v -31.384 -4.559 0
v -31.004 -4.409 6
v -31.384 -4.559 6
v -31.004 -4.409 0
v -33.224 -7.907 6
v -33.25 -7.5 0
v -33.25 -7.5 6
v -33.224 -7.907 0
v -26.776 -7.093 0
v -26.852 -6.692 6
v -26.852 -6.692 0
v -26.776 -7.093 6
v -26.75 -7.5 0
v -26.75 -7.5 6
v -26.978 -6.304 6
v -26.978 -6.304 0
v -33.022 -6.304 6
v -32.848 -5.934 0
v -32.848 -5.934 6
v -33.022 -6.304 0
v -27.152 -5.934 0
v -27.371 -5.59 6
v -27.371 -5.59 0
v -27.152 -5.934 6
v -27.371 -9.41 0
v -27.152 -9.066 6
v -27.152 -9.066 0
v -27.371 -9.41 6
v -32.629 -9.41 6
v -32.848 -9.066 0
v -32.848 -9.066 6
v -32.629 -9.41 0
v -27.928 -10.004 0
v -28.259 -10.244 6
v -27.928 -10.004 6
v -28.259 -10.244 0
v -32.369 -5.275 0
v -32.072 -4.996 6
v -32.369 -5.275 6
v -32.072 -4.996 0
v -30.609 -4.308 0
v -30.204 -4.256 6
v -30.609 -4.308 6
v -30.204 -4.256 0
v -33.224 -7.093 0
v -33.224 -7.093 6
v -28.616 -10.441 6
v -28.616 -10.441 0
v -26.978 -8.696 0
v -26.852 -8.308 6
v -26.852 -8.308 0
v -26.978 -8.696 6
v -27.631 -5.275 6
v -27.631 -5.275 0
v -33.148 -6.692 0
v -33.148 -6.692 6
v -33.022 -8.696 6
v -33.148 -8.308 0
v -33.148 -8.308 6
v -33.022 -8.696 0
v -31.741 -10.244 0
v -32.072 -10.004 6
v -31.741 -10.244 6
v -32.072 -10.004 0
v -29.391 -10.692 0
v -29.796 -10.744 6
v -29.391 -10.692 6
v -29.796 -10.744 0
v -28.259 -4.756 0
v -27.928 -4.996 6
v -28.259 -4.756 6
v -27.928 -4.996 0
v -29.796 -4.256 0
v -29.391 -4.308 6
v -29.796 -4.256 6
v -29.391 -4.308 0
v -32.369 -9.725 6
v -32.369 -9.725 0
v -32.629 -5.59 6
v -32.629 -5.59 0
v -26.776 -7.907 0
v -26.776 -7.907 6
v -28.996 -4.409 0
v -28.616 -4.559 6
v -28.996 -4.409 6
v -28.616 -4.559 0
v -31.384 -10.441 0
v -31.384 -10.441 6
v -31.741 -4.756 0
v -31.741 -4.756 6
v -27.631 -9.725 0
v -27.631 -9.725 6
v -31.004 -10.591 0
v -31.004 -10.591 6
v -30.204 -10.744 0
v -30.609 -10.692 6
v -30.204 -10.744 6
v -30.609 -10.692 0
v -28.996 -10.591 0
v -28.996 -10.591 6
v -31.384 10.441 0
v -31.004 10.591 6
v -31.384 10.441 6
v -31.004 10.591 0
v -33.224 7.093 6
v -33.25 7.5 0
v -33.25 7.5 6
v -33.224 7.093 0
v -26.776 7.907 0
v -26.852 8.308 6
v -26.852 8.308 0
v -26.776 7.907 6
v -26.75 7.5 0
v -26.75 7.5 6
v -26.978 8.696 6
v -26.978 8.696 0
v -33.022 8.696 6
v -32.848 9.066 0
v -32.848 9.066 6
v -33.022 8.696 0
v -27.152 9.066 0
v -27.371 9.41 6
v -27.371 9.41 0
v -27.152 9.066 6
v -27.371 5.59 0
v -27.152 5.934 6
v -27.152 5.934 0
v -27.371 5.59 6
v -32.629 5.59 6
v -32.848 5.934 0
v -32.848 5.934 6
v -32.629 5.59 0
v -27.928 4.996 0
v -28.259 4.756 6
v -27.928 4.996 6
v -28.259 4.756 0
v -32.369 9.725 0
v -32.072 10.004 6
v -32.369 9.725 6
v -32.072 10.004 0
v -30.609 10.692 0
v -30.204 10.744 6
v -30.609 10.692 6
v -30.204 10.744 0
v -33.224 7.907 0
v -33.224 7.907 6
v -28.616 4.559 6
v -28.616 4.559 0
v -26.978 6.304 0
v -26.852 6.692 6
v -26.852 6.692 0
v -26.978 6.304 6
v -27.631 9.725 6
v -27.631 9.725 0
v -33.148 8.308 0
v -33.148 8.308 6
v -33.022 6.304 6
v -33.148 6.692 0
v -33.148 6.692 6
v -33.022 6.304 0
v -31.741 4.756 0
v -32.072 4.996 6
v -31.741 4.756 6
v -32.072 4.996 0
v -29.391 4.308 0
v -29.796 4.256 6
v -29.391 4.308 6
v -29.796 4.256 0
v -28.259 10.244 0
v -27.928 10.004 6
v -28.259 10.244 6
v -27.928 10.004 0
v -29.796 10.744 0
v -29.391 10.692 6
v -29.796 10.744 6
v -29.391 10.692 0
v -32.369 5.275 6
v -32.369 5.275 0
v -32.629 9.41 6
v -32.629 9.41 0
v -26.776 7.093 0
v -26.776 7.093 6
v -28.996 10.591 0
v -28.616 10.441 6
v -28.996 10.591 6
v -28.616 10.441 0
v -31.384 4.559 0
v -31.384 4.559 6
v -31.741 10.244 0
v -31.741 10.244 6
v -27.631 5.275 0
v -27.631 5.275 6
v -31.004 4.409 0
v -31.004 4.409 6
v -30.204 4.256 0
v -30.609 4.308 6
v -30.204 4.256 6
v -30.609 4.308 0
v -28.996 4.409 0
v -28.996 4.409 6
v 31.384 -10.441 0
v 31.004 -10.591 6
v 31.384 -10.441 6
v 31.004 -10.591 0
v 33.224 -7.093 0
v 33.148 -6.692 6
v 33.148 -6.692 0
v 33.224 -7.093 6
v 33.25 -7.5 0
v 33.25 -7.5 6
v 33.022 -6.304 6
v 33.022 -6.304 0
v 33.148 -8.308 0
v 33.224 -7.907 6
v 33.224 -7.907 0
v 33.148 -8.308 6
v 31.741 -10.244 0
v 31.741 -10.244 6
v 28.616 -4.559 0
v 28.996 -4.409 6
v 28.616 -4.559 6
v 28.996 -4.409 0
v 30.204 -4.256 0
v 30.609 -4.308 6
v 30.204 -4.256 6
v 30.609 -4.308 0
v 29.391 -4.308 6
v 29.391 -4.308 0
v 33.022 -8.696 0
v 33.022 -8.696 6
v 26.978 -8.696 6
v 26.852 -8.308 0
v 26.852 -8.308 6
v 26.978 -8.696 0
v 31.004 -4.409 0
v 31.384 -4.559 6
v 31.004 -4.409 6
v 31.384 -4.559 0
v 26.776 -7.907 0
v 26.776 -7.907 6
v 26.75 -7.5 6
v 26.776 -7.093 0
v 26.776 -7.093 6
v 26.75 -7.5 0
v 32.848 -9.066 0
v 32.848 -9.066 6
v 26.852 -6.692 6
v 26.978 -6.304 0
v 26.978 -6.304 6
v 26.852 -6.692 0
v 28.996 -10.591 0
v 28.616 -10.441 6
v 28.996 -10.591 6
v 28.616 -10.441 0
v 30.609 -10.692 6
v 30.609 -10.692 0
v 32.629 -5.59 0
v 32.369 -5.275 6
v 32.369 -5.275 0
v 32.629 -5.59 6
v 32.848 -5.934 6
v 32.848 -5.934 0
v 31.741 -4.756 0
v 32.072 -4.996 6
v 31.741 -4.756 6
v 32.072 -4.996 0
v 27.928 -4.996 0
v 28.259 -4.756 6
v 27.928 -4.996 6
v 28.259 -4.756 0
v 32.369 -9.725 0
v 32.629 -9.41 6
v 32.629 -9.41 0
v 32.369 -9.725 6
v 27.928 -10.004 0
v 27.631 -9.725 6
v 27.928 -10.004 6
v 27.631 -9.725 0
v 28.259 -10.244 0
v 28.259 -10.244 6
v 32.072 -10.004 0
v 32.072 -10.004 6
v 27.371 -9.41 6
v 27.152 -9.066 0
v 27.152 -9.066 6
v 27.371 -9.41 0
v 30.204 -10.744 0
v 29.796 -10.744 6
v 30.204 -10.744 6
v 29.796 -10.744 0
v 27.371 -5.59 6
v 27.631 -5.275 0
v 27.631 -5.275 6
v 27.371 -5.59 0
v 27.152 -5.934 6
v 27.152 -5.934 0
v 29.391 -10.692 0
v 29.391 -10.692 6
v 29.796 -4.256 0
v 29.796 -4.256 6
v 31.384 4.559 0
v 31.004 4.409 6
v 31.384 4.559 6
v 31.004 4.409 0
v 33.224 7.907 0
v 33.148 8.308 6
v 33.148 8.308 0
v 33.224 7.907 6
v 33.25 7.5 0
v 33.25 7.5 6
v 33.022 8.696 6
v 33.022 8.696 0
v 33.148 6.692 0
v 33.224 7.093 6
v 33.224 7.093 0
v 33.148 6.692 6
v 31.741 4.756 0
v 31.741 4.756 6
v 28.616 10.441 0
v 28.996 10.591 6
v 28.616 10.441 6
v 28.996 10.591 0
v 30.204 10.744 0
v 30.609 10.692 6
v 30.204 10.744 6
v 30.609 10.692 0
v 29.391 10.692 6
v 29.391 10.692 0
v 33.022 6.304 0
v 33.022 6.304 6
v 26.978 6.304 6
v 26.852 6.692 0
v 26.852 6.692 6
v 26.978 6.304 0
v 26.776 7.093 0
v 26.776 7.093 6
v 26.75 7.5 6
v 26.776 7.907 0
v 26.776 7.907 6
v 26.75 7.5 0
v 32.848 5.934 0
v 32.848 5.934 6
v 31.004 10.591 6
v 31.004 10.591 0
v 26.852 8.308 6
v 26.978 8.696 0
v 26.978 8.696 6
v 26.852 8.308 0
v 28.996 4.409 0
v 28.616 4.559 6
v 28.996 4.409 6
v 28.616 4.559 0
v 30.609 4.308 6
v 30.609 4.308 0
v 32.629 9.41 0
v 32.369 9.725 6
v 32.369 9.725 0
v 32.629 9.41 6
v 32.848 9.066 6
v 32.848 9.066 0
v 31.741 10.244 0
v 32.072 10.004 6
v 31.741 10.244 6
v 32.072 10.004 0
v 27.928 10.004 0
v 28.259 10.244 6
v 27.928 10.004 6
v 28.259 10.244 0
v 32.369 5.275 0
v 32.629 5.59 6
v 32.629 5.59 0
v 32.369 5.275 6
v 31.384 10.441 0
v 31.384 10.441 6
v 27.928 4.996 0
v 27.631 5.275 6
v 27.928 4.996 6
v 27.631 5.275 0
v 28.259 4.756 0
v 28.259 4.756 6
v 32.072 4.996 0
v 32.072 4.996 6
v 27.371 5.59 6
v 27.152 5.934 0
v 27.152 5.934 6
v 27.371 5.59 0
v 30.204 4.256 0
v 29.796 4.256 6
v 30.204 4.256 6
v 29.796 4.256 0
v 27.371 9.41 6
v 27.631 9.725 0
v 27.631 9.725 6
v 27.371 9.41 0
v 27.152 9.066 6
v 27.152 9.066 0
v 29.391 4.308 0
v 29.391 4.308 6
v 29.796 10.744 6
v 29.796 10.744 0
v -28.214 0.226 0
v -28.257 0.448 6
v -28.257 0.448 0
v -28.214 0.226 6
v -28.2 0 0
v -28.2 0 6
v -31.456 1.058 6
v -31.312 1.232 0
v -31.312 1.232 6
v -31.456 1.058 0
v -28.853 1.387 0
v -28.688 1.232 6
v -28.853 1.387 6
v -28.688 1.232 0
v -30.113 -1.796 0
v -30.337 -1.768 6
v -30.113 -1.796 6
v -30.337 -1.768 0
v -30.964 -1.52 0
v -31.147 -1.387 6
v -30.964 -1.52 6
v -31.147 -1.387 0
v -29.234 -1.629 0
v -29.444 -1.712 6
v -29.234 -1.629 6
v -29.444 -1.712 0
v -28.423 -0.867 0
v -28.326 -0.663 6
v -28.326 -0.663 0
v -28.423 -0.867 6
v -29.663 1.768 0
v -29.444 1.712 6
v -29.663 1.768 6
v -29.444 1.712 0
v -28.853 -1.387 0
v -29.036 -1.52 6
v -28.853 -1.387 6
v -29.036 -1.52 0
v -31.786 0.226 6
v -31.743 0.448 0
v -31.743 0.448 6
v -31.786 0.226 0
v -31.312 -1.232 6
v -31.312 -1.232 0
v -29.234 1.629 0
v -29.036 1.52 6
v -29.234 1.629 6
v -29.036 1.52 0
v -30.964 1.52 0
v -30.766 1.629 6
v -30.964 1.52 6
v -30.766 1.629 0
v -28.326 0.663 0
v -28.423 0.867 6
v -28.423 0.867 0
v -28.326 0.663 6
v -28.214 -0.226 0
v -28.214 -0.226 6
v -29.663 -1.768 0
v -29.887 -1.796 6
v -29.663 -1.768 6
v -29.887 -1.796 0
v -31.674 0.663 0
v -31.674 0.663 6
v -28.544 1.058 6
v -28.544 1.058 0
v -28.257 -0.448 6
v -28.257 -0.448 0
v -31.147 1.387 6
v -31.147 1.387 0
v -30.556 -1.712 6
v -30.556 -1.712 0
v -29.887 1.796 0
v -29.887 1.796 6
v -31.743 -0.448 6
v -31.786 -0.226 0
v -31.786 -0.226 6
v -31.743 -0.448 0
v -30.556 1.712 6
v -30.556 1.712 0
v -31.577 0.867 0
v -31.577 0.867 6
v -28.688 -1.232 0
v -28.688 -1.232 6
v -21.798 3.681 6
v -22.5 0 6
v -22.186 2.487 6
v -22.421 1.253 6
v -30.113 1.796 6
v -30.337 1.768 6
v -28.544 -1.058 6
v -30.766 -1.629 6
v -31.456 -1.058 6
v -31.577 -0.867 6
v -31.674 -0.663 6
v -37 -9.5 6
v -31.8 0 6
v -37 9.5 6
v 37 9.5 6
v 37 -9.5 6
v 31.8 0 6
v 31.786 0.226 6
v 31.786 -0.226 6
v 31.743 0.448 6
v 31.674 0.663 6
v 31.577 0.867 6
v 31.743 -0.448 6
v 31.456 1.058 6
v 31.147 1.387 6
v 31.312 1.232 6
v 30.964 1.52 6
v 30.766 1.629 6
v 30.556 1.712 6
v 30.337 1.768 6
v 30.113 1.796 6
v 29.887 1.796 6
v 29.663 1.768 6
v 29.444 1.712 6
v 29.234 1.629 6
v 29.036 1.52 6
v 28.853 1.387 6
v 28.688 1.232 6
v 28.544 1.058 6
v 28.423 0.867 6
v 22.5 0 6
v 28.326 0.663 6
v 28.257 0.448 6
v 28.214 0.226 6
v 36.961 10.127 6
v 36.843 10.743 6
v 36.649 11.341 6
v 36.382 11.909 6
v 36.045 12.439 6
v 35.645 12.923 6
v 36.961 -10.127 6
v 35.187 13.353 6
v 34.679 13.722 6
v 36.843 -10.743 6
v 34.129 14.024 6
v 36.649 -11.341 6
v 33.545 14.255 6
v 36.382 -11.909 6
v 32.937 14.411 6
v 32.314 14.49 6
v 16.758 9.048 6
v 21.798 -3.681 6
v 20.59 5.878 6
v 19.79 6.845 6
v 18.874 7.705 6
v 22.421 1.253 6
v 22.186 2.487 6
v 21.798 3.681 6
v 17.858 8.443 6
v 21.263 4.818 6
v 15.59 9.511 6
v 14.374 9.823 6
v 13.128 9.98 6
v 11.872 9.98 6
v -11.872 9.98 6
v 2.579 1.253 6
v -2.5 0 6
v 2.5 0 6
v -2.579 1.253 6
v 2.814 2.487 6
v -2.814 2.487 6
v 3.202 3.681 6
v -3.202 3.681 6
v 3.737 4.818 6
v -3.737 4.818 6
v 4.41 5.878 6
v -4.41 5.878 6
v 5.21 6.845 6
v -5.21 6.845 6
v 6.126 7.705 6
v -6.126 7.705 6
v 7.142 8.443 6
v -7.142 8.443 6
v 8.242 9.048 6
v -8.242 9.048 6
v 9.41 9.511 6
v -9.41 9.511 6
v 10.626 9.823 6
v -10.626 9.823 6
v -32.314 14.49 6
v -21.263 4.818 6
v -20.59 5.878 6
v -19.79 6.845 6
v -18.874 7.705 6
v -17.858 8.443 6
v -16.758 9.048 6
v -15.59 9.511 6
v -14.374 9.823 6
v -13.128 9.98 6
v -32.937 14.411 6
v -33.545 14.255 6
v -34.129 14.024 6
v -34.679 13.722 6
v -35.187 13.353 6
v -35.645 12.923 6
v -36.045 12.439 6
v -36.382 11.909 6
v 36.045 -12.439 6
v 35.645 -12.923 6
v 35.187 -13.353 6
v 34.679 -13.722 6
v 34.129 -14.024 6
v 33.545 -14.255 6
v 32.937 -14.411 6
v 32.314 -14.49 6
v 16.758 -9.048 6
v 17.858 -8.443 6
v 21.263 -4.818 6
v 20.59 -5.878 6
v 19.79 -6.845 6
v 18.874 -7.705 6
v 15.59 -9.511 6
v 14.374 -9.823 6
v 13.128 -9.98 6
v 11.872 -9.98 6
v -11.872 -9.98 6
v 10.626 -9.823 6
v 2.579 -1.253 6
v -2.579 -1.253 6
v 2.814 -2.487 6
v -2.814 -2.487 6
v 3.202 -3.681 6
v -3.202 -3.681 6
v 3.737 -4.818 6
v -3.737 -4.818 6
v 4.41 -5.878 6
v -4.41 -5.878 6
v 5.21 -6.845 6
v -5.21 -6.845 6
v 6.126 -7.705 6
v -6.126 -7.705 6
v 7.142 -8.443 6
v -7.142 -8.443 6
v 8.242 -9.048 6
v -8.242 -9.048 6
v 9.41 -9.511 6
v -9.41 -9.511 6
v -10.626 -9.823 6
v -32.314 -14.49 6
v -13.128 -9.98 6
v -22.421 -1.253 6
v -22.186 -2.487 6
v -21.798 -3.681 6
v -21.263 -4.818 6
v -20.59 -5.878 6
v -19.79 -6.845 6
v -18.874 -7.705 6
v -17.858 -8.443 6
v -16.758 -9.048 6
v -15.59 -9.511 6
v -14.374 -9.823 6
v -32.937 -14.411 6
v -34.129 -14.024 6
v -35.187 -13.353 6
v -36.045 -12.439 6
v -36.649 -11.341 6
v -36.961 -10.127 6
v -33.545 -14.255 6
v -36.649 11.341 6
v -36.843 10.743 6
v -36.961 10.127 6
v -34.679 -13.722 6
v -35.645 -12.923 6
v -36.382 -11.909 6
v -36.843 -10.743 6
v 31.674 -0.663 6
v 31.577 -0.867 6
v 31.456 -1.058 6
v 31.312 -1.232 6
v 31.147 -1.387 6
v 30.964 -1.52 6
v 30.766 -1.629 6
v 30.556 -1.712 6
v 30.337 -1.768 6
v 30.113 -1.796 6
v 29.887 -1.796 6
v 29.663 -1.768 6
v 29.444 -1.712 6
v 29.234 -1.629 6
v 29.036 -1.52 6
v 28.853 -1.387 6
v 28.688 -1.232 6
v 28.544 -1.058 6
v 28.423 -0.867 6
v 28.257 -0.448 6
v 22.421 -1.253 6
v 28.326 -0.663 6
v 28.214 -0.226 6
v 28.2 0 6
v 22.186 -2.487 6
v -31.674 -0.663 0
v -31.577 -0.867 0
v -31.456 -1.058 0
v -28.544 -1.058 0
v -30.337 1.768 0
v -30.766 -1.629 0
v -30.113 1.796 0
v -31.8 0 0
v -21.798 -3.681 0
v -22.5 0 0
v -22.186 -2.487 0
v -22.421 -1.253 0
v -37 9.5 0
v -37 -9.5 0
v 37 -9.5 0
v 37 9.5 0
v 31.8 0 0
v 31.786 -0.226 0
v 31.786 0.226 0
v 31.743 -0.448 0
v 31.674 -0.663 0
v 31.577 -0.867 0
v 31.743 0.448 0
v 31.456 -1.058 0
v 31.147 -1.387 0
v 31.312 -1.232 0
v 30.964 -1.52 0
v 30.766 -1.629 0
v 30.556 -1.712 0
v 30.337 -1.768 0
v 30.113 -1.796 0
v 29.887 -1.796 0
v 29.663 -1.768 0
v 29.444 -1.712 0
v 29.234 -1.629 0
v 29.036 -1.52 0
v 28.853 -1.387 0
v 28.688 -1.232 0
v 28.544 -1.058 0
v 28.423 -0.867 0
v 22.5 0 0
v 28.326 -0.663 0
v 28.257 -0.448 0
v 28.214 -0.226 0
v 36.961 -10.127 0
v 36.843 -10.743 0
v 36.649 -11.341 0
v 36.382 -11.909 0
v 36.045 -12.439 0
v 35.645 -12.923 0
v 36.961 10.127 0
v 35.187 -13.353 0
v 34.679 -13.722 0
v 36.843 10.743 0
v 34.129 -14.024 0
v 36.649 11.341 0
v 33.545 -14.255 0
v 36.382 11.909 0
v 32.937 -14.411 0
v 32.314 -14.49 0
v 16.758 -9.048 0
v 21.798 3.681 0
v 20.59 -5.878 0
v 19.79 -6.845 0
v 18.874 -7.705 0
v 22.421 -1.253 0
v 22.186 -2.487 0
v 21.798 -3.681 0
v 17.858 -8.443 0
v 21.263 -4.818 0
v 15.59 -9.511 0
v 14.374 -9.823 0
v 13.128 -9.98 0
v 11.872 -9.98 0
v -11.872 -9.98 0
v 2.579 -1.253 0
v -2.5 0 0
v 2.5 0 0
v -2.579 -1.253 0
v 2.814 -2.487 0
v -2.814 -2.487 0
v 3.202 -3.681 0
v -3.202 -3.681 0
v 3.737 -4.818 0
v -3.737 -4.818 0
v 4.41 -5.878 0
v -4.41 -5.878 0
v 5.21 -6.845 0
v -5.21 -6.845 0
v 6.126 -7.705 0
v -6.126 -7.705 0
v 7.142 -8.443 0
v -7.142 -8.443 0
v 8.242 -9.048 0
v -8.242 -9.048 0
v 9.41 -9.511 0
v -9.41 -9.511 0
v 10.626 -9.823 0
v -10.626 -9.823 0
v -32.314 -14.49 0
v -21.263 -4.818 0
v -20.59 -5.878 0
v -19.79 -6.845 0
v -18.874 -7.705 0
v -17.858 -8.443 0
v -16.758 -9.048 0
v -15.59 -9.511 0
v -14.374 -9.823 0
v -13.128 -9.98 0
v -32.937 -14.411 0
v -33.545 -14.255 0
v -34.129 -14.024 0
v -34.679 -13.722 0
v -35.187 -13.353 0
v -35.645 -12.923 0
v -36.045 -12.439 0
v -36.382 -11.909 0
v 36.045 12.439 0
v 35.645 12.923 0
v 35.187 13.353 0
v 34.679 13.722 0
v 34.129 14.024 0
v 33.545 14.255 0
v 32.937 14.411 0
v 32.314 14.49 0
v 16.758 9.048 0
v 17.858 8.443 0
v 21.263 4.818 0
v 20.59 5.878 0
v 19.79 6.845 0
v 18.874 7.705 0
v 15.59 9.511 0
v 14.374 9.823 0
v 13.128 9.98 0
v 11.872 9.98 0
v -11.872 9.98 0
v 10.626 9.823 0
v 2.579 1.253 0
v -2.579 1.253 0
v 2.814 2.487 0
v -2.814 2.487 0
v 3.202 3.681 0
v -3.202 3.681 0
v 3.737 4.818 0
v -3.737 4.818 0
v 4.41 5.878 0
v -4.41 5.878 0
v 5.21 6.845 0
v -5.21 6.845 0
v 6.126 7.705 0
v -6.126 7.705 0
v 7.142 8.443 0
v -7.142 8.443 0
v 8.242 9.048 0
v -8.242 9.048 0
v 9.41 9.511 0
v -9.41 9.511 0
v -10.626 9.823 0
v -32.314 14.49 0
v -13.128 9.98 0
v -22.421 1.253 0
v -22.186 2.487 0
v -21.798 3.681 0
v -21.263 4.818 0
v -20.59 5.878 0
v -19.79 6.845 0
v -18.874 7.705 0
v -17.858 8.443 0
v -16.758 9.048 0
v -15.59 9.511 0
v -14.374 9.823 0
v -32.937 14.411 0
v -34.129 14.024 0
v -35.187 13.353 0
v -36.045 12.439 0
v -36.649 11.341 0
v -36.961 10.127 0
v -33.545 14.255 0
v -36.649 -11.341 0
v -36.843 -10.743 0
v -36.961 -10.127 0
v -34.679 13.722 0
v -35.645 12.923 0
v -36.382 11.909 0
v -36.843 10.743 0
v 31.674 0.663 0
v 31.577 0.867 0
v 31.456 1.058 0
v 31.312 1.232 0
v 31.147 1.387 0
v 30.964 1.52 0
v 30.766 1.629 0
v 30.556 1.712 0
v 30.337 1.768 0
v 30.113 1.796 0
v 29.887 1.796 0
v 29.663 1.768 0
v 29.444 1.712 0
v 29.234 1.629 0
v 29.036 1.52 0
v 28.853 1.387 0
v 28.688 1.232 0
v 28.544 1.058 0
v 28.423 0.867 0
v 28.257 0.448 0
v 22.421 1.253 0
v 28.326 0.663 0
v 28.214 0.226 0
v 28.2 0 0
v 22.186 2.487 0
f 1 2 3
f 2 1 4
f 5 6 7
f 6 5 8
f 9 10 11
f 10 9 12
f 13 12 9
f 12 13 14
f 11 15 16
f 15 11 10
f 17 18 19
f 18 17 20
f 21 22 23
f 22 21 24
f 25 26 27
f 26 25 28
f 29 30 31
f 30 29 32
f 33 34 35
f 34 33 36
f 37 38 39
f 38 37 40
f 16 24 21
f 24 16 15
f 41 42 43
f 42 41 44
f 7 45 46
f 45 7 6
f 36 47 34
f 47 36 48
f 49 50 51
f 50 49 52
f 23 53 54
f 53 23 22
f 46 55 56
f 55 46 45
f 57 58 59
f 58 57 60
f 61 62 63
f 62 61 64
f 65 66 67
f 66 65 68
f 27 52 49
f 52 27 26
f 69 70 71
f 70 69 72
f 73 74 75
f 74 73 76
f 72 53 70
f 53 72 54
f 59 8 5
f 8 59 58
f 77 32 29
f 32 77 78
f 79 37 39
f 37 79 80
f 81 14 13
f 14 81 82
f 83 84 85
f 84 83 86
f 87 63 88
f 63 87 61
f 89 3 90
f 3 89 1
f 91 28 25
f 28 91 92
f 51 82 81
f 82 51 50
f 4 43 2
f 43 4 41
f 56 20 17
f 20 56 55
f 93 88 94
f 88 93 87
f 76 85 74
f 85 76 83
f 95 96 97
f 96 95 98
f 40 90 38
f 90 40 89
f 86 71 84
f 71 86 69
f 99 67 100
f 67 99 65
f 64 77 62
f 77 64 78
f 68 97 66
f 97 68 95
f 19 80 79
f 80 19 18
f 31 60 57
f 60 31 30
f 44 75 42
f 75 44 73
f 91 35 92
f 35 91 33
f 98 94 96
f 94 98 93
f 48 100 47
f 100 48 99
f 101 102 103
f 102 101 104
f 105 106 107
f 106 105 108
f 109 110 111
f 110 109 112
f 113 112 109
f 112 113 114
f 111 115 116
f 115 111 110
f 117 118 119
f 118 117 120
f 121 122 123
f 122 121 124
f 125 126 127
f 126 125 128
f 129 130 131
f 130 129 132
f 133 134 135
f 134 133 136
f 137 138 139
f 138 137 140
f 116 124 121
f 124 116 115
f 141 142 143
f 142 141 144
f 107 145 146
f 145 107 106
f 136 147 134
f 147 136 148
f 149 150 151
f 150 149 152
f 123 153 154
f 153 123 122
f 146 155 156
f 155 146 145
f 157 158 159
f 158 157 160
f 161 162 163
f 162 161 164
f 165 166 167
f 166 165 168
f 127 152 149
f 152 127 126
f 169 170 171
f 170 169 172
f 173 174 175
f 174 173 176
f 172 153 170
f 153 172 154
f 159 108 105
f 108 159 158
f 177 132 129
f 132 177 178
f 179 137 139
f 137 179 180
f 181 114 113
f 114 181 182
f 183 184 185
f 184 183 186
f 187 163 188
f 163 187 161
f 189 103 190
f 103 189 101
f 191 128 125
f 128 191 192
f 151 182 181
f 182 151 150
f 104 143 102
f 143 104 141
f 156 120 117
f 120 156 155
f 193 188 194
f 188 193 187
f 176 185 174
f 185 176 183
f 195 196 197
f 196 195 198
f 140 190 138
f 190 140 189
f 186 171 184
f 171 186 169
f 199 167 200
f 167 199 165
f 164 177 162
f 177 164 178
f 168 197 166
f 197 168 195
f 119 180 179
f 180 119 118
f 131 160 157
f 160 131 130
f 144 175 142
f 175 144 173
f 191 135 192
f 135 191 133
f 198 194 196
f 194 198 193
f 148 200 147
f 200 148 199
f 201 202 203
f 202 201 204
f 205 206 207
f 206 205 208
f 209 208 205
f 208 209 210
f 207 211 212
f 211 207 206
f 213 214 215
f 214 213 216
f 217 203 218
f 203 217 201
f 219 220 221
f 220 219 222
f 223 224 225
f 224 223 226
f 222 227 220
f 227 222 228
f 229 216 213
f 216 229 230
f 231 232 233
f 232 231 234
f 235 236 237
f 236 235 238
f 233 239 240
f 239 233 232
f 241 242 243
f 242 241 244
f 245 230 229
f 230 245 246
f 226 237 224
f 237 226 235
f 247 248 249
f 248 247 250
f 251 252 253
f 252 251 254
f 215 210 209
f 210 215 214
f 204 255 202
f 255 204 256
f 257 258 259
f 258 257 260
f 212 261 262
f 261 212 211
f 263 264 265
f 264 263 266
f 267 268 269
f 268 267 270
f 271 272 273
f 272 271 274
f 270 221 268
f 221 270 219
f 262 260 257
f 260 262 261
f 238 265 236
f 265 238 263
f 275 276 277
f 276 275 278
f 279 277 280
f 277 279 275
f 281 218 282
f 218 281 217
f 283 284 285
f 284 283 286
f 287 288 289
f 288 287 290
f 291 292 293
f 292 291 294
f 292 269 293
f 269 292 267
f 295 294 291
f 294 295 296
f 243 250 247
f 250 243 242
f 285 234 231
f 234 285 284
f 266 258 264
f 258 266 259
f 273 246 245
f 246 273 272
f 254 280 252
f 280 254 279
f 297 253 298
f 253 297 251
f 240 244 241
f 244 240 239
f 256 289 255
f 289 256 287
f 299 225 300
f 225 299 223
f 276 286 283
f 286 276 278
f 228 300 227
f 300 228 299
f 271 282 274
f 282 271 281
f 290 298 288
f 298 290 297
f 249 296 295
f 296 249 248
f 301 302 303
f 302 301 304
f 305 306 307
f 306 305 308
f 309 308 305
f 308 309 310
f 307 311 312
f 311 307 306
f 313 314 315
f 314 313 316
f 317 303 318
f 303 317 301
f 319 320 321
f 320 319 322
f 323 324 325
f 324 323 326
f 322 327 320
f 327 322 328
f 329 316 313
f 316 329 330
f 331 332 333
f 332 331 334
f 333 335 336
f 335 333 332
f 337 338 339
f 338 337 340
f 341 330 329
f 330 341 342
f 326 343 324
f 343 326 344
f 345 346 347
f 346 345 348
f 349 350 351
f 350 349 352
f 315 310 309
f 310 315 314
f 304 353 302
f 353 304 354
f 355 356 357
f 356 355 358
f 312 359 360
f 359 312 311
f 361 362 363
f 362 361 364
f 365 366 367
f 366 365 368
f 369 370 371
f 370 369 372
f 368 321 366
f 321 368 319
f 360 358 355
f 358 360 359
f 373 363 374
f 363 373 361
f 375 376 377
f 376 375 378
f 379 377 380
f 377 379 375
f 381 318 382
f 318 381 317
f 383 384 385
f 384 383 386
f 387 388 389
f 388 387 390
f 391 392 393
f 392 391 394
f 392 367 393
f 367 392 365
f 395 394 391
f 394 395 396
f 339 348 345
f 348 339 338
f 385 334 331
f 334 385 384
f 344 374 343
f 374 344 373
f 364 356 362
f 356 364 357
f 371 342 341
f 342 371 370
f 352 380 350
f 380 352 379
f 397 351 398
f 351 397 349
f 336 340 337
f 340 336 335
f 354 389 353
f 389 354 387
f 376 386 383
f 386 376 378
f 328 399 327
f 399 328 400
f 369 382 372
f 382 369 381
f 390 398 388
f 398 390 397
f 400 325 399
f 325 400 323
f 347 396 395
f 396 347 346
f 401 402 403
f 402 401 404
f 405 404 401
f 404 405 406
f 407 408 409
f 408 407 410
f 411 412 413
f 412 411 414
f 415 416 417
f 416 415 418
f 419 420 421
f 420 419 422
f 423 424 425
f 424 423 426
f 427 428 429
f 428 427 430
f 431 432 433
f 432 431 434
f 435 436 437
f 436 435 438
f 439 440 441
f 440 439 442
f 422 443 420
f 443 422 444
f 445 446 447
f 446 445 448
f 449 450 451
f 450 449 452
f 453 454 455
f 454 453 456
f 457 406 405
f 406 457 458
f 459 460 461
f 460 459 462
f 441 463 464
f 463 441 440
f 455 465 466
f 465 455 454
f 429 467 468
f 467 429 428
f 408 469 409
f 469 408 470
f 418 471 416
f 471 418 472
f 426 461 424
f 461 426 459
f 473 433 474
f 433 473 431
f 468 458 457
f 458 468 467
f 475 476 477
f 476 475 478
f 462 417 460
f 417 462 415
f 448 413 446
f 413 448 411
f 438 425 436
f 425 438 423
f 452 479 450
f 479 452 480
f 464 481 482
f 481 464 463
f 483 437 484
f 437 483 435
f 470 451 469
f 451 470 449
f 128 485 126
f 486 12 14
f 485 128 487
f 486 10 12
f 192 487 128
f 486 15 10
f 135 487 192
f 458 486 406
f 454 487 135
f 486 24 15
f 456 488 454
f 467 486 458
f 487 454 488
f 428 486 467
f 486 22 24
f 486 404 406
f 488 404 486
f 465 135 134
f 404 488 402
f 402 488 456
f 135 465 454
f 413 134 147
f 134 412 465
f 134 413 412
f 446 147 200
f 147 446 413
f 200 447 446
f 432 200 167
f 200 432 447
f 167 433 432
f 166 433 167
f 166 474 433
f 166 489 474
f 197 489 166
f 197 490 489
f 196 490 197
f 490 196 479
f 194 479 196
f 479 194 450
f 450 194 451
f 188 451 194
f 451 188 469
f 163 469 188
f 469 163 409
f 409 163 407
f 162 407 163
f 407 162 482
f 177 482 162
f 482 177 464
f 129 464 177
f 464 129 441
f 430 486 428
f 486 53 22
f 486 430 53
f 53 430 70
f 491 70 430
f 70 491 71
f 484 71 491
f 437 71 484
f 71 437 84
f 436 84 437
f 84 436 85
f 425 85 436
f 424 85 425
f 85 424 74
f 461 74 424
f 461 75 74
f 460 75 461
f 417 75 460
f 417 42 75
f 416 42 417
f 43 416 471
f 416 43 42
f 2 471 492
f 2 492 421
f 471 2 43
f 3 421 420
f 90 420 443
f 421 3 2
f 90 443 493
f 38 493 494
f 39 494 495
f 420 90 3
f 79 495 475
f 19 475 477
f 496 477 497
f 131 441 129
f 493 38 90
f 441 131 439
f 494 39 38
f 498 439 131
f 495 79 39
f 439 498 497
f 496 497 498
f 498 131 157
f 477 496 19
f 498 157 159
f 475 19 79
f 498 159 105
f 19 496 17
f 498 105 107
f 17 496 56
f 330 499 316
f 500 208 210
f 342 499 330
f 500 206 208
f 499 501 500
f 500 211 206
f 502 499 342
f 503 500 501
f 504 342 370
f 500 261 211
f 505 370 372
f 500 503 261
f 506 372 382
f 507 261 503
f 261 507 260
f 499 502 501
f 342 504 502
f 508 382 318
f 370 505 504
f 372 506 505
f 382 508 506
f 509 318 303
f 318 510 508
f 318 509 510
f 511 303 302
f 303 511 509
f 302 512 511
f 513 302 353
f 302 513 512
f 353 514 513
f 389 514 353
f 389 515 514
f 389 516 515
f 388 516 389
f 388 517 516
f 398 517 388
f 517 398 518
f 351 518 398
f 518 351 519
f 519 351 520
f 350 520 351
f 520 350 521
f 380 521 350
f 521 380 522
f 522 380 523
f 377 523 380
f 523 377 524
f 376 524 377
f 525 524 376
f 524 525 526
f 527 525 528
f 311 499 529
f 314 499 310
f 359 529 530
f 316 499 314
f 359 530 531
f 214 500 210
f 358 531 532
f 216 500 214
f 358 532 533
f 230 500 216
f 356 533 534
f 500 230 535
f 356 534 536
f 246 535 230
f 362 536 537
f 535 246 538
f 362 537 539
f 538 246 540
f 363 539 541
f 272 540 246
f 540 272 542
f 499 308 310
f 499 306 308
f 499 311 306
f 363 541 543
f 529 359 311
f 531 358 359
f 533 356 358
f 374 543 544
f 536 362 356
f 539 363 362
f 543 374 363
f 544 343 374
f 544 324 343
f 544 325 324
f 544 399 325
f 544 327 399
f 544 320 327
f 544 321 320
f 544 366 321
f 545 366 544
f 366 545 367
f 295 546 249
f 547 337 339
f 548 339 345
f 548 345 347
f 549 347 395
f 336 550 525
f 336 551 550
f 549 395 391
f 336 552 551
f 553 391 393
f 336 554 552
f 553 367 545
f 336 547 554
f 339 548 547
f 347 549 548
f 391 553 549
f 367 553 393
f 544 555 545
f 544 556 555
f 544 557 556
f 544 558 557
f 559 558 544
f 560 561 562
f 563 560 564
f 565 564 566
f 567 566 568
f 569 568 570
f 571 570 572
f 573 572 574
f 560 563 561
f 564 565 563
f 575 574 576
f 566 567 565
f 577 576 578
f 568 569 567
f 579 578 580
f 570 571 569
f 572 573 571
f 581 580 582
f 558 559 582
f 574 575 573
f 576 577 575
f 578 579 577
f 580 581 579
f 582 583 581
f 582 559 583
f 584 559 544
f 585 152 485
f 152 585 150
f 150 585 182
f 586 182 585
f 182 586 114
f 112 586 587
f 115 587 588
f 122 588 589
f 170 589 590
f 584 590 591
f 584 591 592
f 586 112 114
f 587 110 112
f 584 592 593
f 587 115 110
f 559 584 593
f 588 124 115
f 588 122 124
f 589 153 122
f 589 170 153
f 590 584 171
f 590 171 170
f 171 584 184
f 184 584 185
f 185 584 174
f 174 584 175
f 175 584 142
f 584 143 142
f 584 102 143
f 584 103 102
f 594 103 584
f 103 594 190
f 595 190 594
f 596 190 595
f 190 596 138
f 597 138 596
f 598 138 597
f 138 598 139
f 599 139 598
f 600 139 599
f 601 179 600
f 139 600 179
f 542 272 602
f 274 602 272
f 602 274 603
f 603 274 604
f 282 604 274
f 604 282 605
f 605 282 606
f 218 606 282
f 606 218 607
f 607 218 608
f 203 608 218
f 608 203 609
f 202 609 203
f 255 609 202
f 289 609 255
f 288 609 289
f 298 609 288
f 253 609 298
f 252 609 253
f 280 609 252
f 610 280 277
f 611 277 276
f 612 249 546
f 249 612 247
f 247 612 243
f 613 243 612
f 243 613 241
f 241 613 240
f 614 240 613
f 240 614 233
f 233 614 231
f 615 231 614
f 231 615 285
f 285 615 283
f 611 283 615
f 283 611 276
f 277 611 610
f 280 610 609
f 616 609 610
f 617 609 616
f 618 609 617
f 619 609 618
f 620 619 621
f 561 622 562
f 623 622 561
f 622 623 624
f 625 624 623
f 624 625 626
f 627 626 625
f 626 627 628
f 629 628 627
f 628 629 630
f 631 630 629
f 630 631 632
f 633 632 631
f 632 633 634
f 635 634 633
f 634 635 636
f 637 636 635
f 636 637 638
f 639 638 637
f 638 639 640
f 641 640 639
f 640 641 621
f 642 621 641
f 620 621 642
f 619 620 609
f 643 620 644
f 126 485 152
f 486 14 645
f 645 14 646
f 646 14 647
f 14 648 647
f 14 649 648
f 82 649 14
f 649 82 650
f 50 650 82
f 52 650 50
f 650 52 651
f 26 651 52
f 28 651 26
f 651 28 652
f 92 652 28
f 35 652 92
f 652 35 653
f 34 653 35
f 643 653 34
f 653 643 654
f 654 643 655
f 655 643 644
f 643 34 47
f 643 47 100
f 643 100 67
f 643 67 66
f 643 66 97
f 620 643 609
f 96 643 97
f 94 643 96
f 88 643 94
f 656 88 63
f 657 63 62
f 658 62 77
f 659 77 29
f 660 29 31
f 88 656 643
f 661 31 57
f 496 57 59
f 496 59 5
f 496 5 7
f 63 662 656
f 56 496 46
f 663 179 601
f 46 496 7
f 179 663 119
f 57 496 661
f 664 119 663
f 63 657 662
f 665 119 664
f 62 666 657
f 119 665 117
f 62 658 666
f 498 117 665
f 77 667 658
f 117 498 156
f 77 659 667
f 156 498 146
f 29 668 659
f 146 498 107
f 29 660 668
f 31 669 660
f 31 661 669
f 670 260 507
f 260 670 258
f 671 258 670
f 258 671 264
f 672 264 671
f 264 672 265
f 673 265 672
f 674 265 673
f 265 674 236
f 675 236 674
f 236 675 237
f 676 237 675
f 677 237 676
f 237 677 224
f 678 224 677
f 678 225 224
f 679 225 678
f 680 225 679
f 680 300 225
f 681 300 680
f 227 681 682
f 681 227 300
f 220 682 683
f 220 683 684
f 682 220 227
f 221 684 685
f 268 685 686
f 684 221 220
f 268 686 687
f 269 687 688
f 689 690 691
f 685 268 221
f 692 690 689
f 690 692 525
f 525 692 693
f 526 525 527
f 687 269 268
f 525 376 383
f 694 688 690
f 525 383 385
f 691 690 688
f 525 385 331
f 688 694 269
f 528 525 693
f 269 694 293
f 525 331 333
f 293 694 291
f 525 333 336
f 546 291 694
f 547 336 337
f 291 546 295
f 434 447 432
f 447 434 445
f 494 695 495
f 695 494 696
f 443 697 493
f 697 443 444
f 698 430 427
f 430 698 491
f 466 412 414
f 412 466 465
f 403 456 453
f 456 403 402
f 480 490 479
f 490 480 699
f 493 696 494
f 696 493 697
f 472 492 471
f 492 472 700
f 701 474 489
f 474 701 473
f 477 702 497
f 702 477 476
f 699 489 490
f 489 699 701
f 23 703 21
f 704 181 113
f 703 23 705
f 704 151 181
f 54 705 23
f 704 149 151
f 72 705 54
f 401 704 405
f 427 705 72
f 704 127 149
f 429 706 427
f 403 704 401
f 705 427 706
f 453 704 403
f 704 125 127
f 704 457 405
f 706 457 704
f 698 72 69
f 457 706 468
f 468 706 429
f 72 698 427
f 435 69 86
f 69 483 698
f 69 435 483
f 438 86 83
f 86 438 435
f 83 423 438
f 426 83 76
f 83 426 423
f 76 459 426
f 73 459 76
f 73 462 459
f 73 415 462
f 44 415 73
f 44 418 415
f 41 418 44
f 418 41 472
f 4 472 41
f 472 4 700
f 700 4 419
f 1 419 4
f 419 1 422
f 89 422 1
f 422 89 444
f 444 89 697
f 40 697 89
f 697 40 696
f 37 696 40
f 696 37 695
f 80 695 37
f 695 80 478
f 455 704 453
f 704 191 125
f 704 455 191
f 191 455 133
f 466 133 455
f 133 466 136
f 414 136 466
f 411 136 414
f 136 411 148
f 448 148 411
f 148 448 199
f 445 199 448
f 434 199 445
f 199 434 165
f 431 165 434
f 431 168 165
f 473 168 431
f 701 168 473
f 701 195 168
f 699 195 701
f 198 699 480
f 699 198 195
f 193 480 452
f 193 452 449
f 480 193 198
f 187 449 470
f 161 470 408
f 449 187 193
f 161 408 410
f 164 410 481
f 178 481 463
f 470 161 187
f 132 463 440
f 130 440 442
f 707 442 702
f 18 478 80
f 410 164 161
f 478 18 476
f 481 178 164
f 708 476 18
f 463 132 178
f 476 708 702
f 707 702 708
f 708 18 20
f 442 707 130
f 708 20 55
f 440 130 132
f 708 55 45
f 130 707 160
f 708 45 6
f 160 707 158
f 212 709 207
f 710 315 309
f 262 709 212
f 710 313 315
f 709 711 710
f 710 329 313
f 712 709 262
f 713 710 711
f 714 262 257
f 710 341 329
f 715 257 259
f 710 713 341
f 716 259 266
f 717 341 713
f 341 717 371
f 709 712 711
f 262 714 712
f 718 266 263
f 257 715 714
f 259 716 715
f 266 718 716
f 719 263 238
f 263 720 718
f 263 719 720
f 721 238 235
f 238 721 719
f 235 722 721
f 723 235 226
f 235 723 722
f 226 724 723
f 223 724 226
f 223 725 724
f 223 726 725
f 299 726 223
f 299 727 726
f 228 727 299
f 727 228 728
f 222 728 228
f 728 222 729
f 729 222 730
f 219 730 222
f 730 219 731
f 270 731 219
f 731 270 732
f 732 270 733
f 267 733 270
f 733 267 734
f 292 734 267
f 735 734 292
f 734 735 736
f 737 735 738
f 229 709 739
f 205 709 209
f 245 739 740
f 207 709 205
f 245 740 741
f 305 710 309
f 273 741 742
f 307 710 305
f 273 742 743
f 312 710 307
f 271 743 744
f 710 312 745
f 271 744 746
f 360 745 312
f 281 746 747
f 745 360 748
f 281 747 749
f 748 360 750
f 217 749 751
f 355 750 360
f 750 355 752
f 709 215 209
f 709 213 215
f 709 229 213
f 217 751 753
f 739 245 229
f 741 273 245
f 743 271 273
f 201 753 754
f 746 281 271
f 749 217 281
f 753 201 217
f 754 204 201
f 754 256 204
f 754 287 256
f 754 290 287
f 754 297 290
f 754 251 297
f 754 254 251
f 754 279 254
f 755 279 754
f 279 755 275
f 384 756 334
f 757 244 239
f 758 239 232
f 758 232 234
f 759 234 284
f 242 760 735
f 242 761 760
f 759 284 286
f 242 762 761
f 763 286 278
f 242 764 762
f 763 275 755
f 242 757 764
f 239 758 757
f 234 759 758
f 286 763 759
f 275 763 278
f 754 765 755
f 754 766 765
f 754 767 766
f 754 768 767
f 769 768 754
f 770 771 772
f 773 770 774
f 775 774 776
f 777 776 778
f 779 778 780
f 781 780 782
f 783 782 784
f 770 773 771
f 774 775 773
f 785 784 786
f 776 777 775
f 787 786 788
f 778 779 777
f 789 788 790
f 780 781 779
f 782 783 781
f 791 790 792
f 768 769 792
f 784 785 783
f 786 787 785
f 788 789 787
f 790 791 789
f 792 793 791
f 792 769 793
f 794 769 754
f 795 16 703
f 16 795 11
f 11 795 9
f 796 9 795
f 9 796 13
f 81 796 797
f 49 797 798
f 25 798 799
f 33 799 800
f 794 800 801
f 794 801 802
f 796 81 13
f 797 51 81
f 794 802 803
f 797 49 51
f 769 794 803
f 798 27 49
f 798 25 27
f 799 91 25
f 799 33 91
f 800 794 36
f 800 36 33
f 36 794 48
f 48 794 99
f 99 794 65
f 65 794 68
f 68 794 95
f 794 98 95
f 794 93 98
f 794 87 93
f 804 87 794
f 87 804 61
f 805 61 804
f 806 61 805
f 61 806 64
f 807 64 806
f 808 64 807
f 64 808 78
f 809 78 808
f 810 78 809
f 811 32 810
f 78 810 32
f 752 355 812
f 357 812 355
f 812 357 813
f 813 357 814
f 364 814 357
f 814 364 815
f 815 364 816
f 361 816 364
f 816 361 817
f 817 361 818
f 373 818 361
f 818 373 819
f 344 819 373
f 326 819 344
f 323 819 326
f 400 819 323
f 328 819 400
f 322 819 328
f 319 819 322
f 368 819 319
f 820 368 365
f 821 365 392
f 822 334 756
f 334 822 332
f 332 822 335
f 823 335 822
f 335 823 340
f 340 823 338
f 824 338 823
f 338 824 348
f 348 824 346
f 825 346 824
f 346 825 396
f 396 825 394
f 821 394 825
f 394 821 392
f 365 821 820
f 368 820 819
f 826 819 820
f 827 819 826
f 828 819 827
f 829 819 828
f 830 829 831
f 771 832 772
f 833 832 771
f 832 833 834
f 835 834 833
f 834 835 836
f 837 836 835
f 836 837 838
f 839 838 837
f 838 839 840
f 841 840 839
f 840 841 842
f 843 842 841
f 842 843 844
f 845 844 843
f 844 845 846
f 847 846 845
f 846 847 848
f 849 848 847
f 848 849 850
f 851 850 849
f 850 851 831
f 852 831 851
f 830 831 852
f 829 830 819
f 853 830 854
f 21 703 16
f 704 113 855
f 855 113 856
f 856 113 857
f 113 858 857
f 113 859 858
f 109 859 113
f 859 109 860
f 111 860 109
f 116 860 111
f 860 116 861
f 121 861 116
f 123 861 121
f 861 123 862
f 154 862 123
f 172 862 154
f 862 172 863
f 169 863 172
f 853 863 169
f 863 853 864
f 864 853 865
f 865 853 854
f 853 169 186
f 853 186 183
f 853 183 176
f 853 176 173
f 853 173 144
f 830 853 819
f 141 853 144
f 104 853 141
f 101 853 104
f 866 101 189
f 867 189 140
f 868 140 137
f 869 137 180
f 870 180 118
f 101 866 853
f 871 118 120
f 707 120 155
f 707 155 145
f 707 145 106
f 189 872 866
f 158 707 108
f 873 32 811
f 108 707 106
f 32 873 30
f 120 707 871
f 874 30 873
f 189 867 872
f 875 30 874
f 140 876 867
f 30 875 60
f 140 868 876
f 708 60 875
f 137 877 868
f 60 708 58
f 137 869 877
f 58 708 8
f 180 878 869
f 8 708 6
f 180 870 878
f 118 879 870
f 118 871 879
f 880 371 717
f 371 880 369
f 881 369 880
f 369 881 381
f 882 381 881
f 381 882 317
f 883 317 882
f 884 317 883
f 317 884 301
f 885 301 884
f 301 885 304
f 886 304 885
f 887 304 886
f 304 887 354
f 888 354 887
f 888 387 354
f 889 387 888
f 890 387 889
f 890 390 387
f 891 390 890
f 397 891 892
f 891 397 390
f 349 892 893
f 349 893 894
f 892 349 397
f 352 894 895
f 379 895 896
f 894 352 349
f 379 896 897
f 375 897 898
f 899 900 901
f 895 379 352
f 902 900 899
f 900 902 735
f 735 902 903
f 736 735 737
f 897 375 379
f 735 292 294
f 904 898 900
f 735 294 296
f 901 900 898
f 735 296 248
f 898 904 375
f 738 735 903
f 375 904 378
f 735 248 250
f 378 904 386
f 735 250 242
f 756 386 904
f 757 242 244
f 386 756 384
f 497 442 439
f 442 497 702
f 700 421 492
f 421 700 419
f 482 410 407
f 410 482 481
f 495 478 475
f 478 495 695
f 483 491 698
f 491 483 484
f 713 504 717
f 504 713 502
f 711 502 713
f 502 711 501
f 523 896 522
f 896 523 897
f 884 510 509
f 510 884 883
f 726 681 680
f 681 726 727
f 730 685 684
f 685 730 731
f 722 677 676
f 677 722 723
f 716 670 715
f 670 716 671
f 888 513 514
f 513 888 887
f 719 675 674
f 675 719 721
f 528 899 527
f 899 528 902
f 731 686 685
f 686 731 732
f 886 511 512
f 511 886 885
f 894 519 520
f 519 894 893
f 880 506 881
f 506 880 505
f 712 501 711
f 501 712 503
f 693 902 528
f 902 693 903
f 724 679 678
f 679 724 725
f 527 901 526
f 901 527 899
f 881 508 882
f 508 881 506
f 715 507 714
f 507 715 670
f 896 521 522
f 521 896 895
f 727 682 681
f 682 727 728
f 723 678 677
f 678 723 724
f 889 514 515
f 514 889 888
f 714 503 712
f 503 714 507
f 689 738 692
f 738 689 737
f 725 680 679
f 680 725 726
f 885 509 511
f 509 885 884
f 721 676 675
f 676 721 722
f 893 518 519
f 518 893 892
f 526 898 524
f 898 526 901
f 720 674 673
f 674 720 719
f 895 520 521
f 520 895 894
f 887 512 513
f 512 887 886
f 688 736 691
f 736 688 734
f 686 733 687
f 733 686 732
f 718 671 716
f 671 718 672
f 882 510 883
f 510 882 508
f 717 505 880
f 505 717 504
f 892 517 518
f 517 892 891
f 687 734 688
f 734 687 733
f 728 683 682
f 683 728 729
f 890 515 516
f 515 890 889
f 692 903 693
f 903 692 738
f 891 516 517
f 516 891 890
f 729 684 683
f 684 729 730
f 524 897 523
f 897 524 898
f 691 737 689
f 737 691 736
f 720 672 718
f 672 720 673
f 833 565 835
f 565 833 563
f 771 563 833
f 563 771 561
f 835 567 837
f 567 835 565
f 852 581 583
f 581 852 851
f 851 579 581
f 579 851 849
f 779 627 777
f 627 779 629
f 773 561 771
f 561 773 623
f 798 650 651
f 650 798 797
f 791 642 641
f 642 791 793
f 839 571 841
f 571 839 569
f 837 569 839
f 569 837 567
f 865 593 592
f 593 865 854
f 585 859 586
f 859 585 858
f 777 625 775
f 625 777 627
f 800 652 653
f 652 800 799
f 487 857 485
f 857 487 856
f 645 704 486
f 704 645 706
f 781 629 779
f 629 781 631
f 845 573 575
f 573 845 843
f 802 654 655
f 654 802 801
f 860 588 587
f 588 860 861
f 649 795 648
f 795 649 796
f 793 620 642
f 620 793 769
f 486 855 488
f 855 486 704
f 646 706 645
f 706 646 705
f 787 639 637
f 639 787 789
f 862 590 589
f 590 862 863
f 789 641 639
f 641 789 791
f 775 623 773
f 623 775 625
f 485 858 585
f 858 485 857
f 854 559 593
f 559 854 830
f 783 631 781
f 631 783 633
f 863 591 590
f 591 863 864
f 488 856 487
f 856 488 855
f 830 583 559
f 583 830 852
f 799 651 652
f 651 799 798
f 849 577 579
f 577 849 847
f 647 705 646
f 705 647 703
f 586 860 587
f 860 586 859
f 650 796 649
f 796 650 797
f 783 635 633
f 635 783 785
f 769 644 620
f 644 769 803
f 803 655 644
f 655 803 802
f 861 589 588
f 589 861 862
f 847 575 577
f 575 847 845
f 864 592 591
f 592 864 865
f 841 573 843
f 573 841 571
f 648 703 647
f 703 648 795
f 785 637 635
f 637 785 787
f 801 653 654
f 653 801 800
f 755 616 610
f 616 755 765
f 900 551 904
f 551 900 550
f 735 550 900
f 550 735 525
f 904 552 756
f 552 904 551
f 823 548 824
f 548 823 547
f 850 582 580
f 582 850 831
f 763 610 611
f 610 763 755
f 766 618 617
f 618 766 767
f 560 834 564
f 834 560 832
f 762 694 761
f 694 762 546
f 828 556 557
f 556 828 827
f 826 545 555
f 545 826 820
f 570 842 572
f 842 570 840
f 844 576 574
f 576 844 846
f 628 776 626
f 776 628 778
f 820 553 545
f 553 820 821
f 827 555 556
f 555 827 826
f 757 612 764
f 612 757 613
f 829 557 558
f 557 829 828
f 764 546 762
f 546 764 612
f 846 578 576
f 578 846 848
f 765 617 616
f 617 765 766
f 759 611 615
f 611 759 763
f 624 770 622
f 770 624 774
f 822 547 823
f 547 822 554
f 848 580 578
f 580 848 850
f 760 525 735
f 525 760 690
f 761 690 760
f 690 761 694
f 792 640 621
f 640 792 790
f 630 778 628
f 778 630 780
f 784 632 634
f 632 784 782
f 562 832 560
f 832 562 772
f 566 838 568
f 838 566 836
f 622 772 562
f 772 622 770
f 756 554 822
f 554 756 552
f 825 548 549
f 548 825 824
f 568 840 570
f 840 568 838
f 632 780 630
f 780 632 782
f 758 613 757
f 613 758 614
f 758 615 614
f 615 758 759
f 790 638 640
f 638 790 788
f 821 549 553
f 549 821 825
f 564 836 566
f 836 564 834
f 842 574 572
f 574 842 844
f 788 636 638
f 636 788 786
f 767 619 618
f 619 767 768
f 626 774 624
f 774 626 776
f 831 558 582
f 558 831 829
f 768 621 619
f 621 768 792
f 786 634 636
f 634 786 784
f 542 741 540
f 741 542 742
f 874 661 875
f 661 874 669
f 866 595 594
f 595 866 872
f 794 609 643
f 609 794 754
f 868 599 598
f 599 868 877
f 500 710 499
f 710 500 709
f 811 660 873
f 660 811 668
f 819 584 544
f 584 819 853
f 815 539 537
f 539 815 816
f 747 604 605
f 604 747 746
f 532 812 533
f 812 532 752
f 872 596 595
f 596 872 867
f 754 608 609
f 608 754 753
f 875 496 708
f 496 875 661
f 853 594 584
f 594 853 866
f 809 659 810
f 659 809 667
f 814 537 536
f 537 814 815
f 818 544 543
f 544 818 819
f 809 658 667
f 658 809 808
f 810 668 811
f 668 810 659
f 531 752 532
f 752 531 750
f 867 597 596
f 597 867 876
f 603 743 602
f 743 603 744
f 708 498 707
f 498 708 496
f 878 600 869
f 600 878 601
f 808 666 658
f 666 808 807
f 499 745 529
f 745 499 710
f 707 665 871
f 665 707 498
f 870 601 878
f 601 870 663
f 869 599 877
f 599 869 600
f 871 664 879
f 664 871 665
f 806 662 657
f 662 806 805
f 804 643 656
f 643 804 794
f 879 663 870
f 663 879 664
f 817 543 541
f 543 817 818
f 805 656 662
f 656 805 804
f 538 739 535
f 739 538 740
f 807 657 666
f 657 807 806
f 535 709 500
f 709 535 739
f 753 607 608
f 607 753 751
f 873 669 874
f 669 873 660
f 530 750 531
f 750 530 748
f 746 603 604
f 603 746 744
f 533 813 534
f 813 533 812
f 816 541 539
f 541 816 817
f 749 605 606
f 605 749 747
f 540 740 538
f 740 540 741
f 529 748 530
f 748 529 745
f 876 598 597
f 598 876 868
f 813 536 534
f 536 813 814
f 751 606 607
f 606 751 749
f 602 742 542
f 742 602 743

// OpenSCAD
$fn = 50;


difference() {
	union() {
		hull() {
			translate(v = [-32.0000000000, 9.5000000000, 0]) {
				cylinder(h = 6, r = 5);
			}
			translate(v = [32.0000000000, 9.5000000000, 0]) {
				cylinder(h = 6, r = 5);
			}
			translate(v = [-32.0000000000, -9.5000000000, 0]) {
				cylinder(h = 6, r = 5);
			}
			translate(v = [32.0000000000, -9.5000000000, 0]) {
				cylinder(h = 6, r = 5);
			}
		}
	}
	union() {
		#translate(v = [-30.0000000000, -7.5000000000, 0]) {
			cylinder(h = 6, r = 3.2500000000);
		}
		#translate(v = [-30.0000000000, 7.5000000000, 0]) {
			cylinder(h = 6, r = 3.2500000000);
		}
		#translate(v = [30.0000000000, -7.5000000000, 0]) {
			cylinder(h = 6, r = 3.2500000000);
		}
		#translate(v = [30.0000000000, 7.5000000000, 0]) {
			cylinder(h = 6, r = 3.2500000000);
		}
		#translate(v = [-30.0000000000, -7.5000000000, -100.0000000000]) {
			cylinder(h = 200, r = 3.2500000000);
		}
		#translate(v = [-30.0000000000, 7.5000000000, -100.0000000000]) {
			cylinder(h = 200, r = 3.2500000000);
		}
		#translate(v = [30.0000000000, -7.5000000000, -100.0000000000]) {
			cylinder(h = 200, r = 3.2500000000);
		}
		#translate(v = [30.0000000000, 7.5000000000, -100.0000000000]) {
			cylinder(h = 200, r = 3.2500000000);
		}
		#translate(v = [-30.0000000000, -7.5000000000, 0]) {
			cylinder(h = 6, r = 1.8000000000);
		}
		#translate(v = [-30.0000000000, 0.0000000000, 0]) {
			cylinder(h = 6, r = 1.8000000000);
		}
		#translate(v = [-30.0000000000, 7.5000000000, 0]) {
			cylinder(h = 6, r = 1.8000000000);
		}
		#translate(v = [30.0000000000, -7.5000000000, 0]) {
			cylinder(h = 6, r = 1.8000000000);
		}
		#translate(v = [30.0000000000, 0.0000000000, 0]) {
			cylinder(h = 6, r = 1.8000000000);
		}
		#translate(v = [30.0000000000, 7.5000000000, 0]) {
			cylinder(h = 6, r = 1.8000000000);
		}
		#translate(v = [-30.0000000000, -7.5000000000, 0]) {
			cylinder(h = 6, r = 1.8000000000);
		}
		#translate(v = [-30.0000000000, 0.0000000000, 0]) {
			cylinder(h = 6, r = 1.8000000000);
		}
		#translate(v = [-30.0000000000, 7.5000000000, 0]) {
			cylinder(h = 6, r = 1.8000000000);
		}
		#translate(v = [30.0000000000, -7.5000000000, 0]) {
			cylinder(h = 6, r = 1.8000000000);
		}
		#translate(v = [30.0000000000, 0.0000000000, 0]) {
			cylinder(h = 6, r = 1.8000000000);
		}
		#translate(v = [30.0000000000, 7.5000000000, 0]) {
			cylinder(h = 6, r = 1.8000000000);
		}
		#translate(v = [-30.0000000000, -7.5000000000, 0]) {
			cylinder(h = 6, r = 1.8000000000);
		}
		#translate(v = [-30.0000000000, 0.0000000000, 0]) {
			cylinder(h = 6, r = 1.8000000000);
		}
		#translate(v = [-30.0000000000, 7.5000000000, 0]) {
			cylinder(h = 6, r = 1.8000000000);
		}
		#translate(v = [30.0000000000, -7.5000000000, 0]) {
			cylinder(h = 6, r = 1.8000000000);
		}
		#translate(v = [30.0000000000, 0.0000000000, 0]) {
			cylinder(h = 6, r = 1.8000000000);
		}
		#translate(v = [30.0000000000, 7.5000000000, 0]) {
			cylinder(h = 6, r = 1.8000000000);
		}
		#translate(v = [-12.5000000000, 0, 0]) {
			cylinder(h = 6, r = 10.0000000000);
		}
		#translate(v = [12.5000000000, 0, 0]) {
			cylinder(h = 6, r = 10.0000000000);
		}
	}
}
